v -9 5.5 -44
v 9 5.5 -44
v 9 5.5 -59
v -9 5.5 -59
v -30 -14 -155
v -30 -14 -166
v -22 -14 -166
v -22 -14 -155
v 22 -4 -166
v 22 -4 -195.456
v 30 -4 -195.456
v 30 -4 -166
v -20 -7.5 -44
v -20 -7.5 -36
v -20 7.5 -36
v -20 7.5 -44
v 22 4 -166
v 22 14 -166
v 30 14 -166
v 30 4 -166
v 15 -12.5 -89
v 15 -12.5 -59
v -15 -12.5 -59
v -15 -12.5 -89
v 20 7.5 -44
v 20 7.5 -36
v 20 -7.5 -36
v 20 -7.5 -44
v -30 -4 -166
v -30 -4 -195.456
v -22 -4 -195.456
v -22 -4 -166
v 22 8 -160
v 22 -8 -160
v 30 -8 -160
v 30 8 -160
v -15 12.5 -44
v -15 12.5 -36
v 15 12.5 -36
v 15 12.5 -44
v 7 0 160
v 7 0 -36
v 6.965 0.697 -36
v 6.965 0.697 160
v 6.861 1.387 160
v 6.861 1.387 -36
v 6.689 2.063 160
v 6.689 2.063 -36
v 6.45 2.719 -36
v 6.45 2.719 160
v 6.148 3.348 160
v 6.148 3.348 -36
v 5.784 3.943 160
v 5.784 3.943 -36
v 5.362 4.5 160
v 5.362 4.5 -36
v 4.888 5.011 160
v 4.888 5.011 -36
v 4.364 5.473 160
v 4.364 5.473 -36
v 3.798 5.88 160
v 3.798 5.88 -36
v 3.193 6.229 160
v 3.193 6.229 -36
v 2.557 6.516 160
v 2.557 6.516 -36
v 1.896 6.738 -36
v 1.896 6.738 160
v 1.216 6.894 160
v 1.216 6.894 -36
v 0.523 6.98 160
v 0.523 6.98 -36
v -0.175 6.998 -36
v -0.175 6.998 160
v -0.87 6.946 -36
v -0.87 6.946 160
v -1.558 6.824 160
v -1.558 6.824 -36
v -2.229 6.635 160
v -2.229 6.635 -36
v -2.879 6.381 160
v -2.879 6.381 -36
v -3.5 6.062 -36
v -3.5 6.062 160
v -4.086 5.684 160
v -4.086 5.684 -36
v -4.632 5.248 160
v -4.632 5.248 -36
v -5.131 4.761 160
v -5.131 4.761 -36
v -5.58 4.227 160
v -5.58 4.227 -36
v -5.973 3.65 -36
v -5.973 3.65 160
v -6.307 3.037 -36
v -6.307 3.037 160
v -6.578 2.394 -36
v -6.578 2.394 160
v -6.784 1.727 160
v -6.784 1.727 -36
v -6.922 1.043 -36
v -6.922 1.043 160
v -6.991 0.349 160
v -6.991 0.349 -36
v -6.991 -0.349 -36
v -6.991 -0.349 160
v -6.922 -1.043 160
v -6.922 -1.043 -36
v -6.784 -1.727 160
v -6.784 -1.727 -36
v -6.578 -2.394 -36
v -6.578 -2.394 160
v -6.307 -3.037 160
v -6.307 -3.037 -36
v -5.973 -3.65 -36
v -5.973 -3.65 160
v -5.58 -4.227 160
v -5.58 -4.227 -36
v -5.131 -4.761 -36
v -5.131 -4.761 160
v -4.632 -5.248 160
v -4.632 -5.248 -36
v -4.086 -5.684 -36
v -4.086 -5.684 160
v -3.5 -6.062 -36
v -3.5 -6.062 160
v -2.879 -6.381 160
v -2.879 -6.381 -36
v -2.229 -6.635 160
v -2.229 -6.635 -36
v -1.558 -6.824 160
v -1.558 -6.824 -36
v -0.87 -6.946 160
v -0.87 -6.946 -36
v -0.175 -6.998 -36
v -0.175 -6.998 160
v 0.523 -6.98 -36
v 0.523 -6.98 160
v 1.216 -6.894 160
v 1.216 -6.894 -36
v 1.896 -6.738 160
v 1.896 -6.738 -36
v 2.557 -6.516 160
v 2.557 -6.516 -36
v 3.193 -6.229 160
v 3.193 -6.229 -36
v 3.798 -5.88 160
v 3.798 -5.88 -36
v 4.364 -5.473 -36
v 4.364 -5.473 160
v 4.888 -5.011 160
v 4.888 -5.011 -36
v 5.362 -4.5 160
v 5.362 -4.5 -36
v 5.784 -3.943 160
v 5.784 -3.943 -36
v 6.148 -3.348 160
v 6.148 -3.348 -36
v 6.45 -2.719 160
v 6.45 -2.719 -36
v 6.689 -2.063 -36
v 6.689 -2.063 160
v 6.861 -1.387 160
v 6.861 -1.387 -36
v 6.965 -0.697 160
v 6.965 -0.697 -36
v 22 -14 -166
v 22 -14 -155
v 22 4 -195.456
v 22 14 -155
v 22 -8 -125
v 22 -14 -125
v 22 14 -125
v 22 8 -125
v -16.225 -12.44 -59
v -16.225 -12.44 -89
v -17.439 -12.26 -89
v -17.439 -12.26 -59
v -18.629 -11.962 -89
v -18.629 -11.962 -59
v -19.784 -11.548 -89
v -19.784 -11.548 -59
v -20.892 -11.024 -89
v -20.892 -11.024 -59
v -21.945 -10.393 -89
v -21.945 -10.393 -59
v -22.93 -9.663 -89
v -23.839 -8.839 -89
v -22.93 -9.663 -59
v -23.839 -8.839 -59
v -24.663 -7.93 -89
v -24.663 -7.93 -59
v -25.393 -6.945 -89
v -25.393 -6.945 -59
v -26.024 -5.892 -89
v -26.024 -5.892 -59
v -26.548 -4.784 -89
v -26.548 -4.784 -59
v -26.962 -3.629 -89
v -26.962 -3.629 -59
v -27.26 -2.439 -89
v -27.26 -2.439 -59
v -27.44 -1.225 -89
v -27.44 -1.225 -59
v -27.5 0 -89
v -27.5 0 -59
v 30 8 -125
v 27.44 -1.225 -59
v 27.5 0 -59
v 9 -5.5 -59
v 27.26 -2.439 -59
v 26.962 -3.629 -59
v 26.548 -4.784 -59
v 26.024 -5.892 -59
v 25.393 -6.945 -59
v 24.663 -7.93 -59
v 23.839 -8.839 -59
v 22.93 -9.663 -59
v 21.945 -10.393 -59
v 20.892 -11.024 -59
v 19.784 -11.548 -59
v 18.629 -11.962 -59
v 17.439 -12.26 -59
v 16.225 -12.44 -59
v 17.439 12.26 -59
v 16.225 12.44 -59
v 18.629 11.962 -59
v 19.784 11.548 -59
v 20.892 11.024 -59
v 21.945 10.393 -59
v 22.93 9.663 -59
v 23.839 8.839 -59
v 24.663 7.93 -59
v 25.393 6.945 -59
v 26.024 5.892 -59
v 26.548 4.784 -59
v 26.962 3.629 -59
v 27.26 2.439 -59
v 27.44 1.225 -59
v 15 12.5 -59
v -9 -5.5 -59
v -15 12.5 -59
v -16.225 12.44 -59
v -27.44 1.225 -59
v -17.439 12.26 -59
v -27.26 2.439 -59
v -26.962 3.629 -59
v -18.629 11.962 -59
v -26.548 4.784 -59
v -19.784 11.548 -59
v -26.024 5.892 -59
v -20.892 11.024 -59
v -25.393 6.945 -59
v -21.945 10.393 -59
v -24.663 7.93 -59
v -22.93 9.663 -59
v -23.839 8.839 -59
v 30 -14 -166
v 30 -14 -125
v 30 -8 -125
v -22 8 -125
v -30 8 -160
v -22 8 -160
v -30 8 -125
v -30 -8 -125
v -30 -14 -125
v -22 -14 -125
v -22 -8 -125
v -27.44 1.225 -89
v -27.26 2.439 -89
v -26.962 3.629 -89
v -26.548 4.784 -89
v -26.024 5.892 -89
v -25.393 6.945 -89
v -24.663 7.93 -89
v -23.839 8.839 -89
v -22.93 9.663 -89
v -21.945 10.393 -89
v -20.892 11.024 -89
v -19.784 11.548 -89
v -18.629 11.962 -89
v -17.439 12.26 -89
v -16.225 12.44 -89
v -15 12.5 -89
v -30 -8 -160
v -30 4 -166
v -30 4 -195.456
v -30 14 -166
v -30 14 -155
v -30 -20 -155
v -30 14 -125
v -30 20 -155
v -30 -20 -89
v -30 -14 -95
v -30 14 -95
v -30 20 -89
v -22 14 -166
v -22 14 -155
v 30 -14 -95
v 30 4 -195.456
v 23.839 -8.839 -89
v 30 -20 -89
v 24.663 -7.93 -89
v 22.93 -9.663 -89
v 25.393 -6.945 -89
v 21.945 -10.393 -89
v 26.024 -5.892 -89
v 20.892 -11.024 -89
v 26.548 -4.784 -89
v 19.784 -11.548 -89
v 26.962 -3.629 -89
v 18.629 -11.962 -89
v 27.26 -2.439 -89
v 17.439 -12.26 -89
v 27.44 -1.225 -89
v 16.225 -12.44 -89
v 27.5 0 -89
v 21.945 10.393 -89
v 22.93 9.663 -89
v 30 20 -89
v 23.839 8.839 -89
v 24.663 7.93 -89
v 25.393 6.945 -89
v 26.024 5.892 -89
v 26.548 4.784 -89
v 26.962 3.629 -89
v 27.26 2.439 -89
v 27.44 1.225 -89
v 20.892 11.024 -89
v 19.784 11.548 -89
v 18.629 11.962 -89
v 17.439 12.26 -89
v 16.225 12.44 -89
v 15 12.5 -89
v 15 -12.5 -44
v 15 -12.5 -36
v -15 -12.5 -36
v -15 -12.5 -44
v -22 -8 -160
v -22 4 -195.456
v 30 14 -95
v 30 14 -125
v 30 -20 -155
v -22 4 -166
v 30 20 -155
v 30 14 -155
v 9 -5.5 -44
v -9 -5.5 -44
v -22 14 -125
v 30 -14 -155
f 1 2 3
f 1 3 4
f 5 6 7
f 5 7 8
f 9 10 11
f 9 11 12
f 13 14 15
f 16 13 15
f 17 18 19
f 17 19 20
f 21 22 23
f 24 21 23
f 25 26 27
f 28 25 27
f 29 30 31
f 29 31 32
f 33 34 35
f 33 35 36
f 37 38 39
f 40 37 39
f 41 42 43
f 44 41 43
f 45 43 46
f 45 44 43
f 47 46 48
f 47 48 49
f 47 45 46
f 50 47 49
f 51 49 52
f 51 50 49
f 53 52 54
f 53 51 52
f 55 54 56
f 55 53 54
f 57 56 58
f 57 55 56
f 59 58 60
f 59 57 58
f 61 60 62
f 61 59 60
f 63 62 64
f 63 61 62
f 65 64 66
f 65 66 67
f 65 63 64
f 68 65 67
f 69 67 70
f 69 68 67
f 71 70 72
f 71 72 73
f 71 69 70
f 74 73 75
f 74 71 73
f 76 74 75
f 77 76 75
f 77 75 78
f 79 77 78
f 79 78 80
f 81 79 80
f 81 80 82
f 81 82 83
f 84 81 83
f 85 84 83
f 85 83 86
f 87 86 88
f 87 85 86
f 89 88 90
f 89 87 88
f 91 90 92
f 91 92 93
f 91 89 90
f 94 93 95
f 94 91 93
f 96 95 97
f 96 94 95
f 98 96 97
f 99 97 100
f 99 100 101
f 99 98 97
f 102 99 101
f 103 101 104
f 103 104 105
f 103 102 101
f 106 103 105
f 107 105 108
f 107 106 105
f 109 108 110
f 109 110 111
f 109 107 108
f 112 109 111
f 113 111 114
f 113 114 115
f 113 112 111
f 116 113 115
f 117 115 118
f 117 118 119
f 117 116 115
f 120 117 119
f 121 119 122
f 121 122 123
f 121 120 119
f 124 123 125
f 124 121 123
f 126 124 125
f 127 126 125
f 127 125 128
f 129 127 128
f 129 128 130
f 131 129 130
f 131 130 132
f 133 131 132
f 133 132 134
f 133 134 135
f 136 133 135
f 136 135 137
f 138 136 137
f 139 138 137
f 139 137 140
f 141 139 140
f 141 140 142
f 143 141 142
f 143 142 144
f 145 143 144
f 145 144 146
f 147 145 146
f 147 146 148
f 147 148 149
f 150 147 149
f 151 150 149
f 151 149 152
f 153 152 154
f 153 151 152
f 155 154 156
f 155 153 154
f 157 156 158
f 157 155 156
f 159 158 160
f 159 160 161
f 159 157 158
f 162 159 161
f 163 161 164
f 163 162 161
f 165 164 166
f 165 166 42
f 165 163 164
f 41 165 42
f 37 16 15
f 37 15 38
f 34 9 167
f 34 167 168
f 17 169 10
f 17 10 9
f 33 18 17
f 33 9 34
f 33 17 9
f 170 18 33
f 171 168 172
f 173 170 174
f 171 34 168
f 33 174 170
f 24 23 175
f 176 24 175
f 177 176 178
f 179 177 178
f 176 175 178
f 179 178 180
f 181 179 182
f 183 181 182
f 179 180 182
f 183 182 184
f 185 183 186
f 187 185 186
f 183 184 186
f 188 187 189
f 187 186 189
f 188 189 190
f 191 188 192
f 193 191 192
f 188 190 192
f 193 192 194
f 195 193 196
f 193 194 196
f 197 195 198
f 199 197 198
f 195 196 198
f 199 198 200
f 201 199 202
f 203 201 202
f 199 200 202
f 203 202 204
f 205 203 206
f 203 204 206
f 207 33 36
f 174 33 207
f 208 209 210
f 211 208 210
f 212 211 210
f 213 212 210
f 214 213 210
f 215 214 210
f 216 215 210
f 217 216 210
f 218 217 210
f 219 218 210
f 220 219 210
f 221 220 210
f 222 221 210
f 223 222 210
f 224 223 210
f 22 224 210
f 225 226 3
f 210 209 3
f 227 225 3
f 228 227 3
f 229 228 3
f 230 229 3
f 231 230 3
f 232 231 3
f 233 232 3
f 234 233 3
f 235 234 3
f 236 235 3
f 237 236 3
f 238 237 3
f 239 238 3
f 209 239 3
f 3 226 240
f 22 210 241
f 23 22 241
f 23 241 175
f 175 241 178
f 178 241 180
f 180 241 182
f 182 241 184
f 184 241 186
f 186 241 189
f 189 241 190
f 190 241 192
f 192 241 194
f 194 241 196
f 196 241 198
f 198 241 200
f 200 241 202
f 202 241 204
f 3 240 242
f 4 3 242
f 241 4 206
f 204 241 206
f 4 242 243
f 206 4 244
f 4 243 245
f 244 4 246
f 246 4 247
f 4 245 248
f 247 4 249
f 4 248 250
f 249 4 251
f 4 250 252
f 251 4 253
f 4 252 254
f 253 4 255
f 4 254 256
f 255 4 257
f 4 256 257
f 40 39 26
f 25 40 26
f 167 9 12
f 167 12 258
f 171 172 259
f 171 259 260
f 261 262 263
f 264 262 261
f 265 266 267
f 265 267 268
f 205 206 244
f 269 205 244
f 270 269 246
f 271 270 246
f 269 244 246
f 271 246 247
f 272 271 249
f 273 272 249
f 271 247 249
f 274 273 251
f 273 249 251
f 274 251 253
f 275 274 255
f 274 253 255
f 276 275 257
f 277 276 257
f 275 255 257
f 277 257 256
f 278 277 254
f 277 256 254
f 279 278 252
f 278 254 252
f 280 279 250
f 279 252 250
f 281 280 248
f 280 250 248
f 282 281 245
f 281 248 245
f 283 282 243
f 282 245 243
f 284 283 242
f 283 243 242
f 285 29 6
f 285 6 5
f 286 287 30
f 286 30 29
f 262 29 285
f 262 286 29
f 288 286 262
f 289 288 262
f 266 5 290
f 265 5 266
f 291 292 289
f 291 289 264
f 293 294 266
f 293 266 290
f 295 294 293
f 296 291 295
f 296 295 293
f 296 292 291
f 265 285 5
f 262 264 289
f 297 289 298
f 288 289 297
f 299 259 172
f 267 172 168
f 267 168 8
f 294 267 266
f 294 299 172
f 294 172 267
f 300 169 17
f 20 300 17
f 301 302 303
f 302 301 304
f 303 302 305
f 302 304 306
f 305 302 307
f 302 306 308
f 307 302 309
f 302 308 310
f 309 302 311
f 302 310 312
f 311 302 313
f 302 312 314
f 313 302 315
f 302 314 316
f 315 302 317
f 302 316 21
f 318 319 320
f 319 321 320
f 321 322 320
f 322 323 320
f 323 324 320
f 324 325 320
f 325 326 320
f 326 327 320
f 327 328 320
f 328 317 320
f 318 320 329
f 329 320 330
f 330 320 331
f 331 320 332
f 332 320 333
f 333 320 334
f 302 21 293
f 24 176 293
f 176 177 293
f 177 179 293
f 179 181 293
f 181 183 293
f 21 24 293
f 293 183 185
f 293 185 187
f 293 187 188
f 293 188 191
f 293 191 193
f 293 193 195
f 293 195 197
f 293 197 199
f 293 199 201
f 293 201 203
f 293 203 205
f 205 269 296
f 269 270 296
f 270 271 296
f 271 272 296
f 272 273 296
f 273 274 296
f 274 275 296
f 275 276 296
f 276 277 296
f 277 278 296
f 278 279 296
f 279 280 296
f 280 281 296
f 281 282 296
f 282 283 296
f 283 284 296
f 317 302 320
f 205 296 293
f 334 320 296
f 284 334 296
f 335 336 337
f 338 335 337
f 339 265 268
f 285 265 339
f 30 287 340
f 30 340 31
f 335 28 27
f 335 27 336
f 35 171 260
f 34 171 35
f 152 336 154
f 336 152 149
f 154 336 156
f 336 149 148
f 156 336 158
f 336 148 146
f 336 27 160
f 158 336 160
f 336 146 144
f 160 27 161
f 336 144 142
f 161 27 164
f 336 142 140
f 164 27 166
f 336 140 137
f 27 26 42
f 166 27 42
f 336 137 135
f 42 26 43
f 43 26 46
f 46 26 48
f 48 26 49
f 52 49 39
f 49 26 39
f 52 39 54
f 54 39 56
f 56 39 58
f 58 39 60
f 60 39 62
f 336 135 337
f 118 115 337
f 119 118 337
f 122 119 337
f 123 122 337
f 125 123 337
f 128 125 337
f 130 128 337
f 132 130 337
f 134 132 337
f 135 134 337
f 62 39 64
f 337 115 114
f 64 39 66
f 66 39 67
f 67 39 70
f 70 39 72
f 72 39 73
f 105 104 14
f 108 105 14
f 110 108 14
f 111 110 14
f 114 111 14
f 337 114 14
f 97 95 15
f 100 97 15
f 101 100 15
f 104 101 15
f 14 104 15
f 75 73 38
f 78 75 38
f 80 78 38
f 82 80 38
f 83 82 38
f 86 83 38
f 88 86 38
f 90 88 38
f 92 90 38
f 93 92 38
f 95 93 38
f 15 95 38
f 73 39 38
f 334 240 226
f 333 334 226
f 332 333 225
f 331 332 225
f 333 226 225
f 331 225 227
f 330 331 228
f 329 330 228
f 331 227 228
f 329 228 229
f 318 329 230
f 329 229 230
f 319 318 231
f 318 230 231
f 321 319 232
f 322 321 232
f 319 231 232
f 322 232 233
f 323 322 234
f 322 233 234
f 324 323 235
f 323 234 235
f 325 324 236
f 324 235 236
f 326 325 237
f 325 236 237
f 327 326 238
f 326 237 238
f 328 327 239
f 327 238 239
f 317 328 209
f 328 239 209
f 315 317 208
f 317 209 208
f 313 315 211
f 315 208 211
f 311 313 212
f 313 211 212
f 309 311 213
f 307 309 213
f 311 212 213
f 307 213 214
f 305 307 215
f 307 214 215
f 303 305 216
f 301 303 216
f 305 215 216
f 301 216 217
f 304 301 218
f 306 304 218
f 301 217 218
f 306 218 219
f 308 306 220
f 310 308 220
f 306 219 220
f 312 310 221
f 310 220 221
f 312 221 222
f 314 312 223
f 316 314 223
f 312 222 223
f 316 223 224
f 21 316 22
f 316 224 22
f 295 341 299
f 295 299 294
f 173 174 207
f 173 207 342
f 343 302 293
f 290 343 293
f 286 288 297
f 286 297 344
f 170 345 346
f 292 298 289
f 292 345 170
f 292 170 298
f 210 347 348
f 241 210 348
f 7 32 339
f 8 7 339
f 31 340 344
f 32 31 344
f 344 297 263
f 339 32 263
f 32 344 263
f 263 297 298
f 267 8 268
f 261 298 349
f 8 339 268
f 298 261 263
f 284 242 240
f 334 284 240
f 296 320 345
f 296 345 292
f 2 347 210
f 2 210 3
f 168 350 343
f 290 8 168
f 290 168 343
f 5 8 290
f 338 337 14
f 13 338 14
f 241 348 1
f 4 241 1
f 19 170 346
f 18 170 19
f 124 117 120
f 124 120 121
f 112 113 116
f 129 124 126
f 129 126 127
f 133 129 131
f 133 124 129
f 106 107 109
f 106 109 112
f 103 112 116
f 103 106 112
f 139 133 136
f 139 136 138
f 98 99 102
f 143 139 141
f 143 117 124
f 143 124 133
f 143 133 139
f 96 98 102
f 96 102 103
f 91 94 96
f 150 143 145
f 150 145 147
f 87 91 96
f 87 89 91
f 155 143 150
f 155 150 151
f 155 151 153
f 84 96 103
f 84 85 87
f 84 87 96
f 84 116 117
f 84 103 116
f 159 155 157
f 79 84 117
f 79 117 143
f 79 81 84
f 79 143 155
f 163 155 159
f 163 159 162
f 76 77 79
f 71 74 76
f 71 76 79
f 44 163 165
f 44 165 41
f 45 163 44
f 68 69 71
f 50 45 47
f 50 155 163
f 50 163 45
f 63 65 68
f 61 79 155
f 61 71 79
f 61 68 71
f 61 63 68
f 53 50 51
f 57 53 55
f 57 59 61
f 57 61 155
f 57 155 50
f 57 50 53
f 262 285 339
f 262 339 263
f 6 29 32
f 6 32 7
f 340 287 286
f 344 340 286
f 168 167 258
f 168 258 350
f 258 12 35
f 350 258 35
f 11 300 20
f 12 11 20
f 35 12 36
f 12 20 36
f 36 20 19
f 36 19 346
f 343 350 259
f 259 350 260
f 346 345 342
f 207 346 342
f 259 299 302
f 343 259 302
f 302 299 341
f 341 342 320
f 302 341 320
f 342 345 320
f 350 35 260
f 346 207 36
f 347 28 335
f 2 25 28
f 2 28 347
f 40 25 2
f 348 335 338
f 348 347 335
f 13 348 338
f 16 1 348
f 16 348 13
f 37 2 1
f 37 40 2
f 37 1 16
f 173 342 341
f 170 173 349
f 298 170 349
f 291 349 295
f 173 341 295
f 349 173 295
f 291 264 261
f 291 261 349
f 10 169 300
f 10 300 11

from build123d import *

# Parameters (mm, degrees)
SKETCH_1_R             = 7
EXTRUDE_1_DEPTH        = 160
EXTRUDE_1_DEPTH_BACK   = 36
SKETCH_2_R             = 7
EXTRUDE_2_DEPTH        = 8
SKETCH_3_W             = 18
SKETCH_3_H             = 11
EXTRUDE_3_DEPTH        = 15
EXTRUDE_4_DEPTH        = 30
SKETCH_5_W             = 60
SKETCH_5_H             = 40
EXTRUDE_5_DEPTH        = 6
SKETCH_6_W             = 60
SKETCH_6_H             = 6
EXTRUDE_6_DEPTH        = 60
SKETCH_7_W             = 29.455878384
SKETCH_7_H             = 4
EXTRUDE_7_DEPTH        = 8
PATTERN_LINEAR_1_COUNT = 2
PATTERN_LINEAR_1_PITCH = 52


with BuildPart() as part:
    # 草图1 → 凸台-拉伸1 (new body, two sides)
    with BuildSketch(Plane.XY) as extrude_1_sk:
        Circle(SKETCH_1_R)
    extrude(amount=EXTRUDE_1_DEPTH)
    extrude(extrude_1_sk.sketch, amount=-EXTRUDE_1_DEPTH_BACK)

    # 草图2 → 凸台-拉伸2 (add)
    with BuildSketch(Plane(origin=(0, 0, -36), x_dir=(-1, 0, 0), z_dir=(0, 0, -1))):
        Polygon((20, 7.5), (15, 12.5), (-15, 12.5), (-20, 7.5), (-20, -7.5), (-15, -12.5), (15, -12.5), (20, -7.5), align=None)
        Circle(SKETCH_2_R, mode=Mode.SUBTRACT)
        Circle(SKETCH_2_R)
    extrude(amount=EXTRUDE_2_DEPTH)

    # 草图3 → 凸台-拉伸3 (add)
    with BuildSketch(Plane(origin=(0, 0, -44), x_dir=(-1, 0, 0), z_dir=(0, 0, -1))):
        Rectangle(SKETCH_3_W, SKETCH_3_H)
    extrude(amount=EXTRUDE_3_DEPTH)

    # 草图4 → 凸台-拉伸4 (add)
    with BuildSketch(Plane(origin=(0, 0, -59), x_dir=(-1, 0, 0), z_dir=(0, 0, -1))):
        with BuildLine():
            Line((-15, -12.5), (-15, 12.5))
            ThreePointArc((-15, 12.5), (-27.5, 0), (-15, -12.5))
        make_face()
        with BuildLine():
            ThreePointArc((-3.77502784, 5.5), (-8.385621722, 10.606601718), (-15, 12.5))
            Line((-15, 12.5), (-15, -12.5))
            ThreePointArc((-15, -12.5), (-8.385621722, -10.606601718), (-3.77502784, -5.5))
            Line((-3.77502784, -5.5), (-9, -5.5))
            Line((-9, -5.5), (-9, 5.5))
            Line((-9, 5.5), (-3.77502784, 5.5))
        make_face()
        with BuildLine():
            ThreePointArc((-2.5, 0), (-2.822928267, 2.822928267), (-3.77502784, 5.5))
            Line((-3.77502784, 5.5), (-9, 5.5))
            Line((-9, 5.5), (-9, -5.5))
            Line((-9, -5.5), (-3.77502784, -5.5))
            ThreePointArc((-3.77502784, -5.5), (-2.822928267, -2.822928267), (-2.5, 0))
        make_face()
        with BuildLine():
            ThreePointArc((3.77502784, -5.5), (2.5, 0), (3.77502784, 5.5))
            Line((3.77502784, 5.5), (-3.77502784, 5.5))
            ThreePointArc((-3.77502784, 5.5), (-2.822928267, 2.822928267), (-2.5, 0))
            ThreePointArc((-2.5, 0), (-2.822928267, -2.822928267), (-3.77502784, -5.5))
            Line((-3.77502784, -5.5), (3.77502784, -5.5))
        make_face()
        with BuildLine():
            Line((9, 5.5), (3.77502784, 5.5))
            ThreePointArc((3.77502784, 5.5), (2.5, 0), (3.77502784, -5.5))
            Line((3.77502784, -5.5), (9, -5.5))
            Line((9, -5.5), (9, 5.5))
        make_face()
        with BuildLine():
            Line((15, -12.5), (15, 12.5))
            ThreePointArc((15, 12.5), (8.385621722, 10.606601718), (3.77502784, 5.5))
            Line((3.77502784, 5.5), (9, 5.5))
            Line((9, 5.5), (9, -5.5))
            Line((9, -5.5), (3.77502784, -5.5))
            ThreePointArc((3.77502784, -5.5), (8.385621722, -10.606601718), (15, -12.5))
        make_face()
        with BuildLine():
            ThreePointArc((27.5, 0), (23.838834765, 8.838834765), (15, 12.5))
            Line((15, 12.5), (15, -12.5))
            ThreePointArc((15, -12.5), (23.838834765, -8.838834765), (27.5, 0))
        make_face()
        with BuildLine():
            Line((-15, -12.5), (15, -12.5))
            ThreePointArc((15, -12.5), (8.385621722, -10.606601718), (3.77502784, -5.5))
            Line((3.77502784, -5.5), (-3.77502784, -5.5))
            ThreePointArc((-3.77502784, -5.5), (-8.385621722, -10.606601718), (-15, -12.5))
        make_face()
        with BuildLine():
            ThreePointArc((3.77502784, 5.5), (8.385621722, 10.606601718), (15, 12.5))
            Line((15, 12.5), (-15, 12.5))
            ThreePointArc((-15, 12.5), (-8.385621722, 10.606601718), (-3.77502784, 5.5))
            Line((-3.77502784, 5.5), (3.77502784, 5.5))
        make_face()
    extrude(amount=EXTRUDE_4_DEPTH)

    # 草图5 → 凸台-拉伸5 (add)
    with BuildSketch(Plane(origin=(0, 0, -89), x_dir=(-1, 0, 0), z_dir=(0, 0, -1))):
        Rectangle(SKETCH_5_W, SKETCH_5_H)
    extrude(amount=EXTRUDE_5_DEPTH)

    # 草图6 → 凸台-拉伸6 (add)
    with BuildSketch(Plane(origin=(0, 0, -95), x_dir=(-1, 0, 0), z_dir=(0, 0, -1))):
        with Locations((0, 17)):
            Rectangle(SKETCH_6_W, SKETCH_6_H)
        with Locations((0, -17)):
            Rectangle(SKETCH_6_W, SKETCH_6_H)
    extrude(amount=EXTRUDE_6_DEPTH)

    # 草图7 → 凸台-拉伸7 (add)
    with BuildSketch(Plane.ZY.offset(30)):
        Polygon((-125, 8), (-125, 14), (-155, 14), (-160, 14), (-160, 8), align=None)
        Polygon((-125, -8), (-160, -8), (-160, -14), (-155, -14), (-125, -14), align=None)
        Polygon((-160, 8), (-160, 14), (-166, 14), (-166, 4), (-166, 0), (-166, -4), (-166, -14), (-160, -14), (-160, -8), align=None)
        with Locations((-180.727939192, -2)):
            Rectangle(SKETCH_7_W, SKETCH_7_H)
        with Locations((-180.727939192, 2)):
            Rectangle(SKETCH_7_W, SKETCH_7_H)
    extrude_7 = extrude(amount=-EXTRUDE_7_DEPTH)

    # 阵列(线性)1: 凸台-拉伸7 ×2
    with Locations(*[(i * PATTERN_LINEAR_1_PITCH, 0, 0) for i in range(1, PATTERN_LINEAR_1_COUNT)]):
        add(extrude_7)


solid = part.part
